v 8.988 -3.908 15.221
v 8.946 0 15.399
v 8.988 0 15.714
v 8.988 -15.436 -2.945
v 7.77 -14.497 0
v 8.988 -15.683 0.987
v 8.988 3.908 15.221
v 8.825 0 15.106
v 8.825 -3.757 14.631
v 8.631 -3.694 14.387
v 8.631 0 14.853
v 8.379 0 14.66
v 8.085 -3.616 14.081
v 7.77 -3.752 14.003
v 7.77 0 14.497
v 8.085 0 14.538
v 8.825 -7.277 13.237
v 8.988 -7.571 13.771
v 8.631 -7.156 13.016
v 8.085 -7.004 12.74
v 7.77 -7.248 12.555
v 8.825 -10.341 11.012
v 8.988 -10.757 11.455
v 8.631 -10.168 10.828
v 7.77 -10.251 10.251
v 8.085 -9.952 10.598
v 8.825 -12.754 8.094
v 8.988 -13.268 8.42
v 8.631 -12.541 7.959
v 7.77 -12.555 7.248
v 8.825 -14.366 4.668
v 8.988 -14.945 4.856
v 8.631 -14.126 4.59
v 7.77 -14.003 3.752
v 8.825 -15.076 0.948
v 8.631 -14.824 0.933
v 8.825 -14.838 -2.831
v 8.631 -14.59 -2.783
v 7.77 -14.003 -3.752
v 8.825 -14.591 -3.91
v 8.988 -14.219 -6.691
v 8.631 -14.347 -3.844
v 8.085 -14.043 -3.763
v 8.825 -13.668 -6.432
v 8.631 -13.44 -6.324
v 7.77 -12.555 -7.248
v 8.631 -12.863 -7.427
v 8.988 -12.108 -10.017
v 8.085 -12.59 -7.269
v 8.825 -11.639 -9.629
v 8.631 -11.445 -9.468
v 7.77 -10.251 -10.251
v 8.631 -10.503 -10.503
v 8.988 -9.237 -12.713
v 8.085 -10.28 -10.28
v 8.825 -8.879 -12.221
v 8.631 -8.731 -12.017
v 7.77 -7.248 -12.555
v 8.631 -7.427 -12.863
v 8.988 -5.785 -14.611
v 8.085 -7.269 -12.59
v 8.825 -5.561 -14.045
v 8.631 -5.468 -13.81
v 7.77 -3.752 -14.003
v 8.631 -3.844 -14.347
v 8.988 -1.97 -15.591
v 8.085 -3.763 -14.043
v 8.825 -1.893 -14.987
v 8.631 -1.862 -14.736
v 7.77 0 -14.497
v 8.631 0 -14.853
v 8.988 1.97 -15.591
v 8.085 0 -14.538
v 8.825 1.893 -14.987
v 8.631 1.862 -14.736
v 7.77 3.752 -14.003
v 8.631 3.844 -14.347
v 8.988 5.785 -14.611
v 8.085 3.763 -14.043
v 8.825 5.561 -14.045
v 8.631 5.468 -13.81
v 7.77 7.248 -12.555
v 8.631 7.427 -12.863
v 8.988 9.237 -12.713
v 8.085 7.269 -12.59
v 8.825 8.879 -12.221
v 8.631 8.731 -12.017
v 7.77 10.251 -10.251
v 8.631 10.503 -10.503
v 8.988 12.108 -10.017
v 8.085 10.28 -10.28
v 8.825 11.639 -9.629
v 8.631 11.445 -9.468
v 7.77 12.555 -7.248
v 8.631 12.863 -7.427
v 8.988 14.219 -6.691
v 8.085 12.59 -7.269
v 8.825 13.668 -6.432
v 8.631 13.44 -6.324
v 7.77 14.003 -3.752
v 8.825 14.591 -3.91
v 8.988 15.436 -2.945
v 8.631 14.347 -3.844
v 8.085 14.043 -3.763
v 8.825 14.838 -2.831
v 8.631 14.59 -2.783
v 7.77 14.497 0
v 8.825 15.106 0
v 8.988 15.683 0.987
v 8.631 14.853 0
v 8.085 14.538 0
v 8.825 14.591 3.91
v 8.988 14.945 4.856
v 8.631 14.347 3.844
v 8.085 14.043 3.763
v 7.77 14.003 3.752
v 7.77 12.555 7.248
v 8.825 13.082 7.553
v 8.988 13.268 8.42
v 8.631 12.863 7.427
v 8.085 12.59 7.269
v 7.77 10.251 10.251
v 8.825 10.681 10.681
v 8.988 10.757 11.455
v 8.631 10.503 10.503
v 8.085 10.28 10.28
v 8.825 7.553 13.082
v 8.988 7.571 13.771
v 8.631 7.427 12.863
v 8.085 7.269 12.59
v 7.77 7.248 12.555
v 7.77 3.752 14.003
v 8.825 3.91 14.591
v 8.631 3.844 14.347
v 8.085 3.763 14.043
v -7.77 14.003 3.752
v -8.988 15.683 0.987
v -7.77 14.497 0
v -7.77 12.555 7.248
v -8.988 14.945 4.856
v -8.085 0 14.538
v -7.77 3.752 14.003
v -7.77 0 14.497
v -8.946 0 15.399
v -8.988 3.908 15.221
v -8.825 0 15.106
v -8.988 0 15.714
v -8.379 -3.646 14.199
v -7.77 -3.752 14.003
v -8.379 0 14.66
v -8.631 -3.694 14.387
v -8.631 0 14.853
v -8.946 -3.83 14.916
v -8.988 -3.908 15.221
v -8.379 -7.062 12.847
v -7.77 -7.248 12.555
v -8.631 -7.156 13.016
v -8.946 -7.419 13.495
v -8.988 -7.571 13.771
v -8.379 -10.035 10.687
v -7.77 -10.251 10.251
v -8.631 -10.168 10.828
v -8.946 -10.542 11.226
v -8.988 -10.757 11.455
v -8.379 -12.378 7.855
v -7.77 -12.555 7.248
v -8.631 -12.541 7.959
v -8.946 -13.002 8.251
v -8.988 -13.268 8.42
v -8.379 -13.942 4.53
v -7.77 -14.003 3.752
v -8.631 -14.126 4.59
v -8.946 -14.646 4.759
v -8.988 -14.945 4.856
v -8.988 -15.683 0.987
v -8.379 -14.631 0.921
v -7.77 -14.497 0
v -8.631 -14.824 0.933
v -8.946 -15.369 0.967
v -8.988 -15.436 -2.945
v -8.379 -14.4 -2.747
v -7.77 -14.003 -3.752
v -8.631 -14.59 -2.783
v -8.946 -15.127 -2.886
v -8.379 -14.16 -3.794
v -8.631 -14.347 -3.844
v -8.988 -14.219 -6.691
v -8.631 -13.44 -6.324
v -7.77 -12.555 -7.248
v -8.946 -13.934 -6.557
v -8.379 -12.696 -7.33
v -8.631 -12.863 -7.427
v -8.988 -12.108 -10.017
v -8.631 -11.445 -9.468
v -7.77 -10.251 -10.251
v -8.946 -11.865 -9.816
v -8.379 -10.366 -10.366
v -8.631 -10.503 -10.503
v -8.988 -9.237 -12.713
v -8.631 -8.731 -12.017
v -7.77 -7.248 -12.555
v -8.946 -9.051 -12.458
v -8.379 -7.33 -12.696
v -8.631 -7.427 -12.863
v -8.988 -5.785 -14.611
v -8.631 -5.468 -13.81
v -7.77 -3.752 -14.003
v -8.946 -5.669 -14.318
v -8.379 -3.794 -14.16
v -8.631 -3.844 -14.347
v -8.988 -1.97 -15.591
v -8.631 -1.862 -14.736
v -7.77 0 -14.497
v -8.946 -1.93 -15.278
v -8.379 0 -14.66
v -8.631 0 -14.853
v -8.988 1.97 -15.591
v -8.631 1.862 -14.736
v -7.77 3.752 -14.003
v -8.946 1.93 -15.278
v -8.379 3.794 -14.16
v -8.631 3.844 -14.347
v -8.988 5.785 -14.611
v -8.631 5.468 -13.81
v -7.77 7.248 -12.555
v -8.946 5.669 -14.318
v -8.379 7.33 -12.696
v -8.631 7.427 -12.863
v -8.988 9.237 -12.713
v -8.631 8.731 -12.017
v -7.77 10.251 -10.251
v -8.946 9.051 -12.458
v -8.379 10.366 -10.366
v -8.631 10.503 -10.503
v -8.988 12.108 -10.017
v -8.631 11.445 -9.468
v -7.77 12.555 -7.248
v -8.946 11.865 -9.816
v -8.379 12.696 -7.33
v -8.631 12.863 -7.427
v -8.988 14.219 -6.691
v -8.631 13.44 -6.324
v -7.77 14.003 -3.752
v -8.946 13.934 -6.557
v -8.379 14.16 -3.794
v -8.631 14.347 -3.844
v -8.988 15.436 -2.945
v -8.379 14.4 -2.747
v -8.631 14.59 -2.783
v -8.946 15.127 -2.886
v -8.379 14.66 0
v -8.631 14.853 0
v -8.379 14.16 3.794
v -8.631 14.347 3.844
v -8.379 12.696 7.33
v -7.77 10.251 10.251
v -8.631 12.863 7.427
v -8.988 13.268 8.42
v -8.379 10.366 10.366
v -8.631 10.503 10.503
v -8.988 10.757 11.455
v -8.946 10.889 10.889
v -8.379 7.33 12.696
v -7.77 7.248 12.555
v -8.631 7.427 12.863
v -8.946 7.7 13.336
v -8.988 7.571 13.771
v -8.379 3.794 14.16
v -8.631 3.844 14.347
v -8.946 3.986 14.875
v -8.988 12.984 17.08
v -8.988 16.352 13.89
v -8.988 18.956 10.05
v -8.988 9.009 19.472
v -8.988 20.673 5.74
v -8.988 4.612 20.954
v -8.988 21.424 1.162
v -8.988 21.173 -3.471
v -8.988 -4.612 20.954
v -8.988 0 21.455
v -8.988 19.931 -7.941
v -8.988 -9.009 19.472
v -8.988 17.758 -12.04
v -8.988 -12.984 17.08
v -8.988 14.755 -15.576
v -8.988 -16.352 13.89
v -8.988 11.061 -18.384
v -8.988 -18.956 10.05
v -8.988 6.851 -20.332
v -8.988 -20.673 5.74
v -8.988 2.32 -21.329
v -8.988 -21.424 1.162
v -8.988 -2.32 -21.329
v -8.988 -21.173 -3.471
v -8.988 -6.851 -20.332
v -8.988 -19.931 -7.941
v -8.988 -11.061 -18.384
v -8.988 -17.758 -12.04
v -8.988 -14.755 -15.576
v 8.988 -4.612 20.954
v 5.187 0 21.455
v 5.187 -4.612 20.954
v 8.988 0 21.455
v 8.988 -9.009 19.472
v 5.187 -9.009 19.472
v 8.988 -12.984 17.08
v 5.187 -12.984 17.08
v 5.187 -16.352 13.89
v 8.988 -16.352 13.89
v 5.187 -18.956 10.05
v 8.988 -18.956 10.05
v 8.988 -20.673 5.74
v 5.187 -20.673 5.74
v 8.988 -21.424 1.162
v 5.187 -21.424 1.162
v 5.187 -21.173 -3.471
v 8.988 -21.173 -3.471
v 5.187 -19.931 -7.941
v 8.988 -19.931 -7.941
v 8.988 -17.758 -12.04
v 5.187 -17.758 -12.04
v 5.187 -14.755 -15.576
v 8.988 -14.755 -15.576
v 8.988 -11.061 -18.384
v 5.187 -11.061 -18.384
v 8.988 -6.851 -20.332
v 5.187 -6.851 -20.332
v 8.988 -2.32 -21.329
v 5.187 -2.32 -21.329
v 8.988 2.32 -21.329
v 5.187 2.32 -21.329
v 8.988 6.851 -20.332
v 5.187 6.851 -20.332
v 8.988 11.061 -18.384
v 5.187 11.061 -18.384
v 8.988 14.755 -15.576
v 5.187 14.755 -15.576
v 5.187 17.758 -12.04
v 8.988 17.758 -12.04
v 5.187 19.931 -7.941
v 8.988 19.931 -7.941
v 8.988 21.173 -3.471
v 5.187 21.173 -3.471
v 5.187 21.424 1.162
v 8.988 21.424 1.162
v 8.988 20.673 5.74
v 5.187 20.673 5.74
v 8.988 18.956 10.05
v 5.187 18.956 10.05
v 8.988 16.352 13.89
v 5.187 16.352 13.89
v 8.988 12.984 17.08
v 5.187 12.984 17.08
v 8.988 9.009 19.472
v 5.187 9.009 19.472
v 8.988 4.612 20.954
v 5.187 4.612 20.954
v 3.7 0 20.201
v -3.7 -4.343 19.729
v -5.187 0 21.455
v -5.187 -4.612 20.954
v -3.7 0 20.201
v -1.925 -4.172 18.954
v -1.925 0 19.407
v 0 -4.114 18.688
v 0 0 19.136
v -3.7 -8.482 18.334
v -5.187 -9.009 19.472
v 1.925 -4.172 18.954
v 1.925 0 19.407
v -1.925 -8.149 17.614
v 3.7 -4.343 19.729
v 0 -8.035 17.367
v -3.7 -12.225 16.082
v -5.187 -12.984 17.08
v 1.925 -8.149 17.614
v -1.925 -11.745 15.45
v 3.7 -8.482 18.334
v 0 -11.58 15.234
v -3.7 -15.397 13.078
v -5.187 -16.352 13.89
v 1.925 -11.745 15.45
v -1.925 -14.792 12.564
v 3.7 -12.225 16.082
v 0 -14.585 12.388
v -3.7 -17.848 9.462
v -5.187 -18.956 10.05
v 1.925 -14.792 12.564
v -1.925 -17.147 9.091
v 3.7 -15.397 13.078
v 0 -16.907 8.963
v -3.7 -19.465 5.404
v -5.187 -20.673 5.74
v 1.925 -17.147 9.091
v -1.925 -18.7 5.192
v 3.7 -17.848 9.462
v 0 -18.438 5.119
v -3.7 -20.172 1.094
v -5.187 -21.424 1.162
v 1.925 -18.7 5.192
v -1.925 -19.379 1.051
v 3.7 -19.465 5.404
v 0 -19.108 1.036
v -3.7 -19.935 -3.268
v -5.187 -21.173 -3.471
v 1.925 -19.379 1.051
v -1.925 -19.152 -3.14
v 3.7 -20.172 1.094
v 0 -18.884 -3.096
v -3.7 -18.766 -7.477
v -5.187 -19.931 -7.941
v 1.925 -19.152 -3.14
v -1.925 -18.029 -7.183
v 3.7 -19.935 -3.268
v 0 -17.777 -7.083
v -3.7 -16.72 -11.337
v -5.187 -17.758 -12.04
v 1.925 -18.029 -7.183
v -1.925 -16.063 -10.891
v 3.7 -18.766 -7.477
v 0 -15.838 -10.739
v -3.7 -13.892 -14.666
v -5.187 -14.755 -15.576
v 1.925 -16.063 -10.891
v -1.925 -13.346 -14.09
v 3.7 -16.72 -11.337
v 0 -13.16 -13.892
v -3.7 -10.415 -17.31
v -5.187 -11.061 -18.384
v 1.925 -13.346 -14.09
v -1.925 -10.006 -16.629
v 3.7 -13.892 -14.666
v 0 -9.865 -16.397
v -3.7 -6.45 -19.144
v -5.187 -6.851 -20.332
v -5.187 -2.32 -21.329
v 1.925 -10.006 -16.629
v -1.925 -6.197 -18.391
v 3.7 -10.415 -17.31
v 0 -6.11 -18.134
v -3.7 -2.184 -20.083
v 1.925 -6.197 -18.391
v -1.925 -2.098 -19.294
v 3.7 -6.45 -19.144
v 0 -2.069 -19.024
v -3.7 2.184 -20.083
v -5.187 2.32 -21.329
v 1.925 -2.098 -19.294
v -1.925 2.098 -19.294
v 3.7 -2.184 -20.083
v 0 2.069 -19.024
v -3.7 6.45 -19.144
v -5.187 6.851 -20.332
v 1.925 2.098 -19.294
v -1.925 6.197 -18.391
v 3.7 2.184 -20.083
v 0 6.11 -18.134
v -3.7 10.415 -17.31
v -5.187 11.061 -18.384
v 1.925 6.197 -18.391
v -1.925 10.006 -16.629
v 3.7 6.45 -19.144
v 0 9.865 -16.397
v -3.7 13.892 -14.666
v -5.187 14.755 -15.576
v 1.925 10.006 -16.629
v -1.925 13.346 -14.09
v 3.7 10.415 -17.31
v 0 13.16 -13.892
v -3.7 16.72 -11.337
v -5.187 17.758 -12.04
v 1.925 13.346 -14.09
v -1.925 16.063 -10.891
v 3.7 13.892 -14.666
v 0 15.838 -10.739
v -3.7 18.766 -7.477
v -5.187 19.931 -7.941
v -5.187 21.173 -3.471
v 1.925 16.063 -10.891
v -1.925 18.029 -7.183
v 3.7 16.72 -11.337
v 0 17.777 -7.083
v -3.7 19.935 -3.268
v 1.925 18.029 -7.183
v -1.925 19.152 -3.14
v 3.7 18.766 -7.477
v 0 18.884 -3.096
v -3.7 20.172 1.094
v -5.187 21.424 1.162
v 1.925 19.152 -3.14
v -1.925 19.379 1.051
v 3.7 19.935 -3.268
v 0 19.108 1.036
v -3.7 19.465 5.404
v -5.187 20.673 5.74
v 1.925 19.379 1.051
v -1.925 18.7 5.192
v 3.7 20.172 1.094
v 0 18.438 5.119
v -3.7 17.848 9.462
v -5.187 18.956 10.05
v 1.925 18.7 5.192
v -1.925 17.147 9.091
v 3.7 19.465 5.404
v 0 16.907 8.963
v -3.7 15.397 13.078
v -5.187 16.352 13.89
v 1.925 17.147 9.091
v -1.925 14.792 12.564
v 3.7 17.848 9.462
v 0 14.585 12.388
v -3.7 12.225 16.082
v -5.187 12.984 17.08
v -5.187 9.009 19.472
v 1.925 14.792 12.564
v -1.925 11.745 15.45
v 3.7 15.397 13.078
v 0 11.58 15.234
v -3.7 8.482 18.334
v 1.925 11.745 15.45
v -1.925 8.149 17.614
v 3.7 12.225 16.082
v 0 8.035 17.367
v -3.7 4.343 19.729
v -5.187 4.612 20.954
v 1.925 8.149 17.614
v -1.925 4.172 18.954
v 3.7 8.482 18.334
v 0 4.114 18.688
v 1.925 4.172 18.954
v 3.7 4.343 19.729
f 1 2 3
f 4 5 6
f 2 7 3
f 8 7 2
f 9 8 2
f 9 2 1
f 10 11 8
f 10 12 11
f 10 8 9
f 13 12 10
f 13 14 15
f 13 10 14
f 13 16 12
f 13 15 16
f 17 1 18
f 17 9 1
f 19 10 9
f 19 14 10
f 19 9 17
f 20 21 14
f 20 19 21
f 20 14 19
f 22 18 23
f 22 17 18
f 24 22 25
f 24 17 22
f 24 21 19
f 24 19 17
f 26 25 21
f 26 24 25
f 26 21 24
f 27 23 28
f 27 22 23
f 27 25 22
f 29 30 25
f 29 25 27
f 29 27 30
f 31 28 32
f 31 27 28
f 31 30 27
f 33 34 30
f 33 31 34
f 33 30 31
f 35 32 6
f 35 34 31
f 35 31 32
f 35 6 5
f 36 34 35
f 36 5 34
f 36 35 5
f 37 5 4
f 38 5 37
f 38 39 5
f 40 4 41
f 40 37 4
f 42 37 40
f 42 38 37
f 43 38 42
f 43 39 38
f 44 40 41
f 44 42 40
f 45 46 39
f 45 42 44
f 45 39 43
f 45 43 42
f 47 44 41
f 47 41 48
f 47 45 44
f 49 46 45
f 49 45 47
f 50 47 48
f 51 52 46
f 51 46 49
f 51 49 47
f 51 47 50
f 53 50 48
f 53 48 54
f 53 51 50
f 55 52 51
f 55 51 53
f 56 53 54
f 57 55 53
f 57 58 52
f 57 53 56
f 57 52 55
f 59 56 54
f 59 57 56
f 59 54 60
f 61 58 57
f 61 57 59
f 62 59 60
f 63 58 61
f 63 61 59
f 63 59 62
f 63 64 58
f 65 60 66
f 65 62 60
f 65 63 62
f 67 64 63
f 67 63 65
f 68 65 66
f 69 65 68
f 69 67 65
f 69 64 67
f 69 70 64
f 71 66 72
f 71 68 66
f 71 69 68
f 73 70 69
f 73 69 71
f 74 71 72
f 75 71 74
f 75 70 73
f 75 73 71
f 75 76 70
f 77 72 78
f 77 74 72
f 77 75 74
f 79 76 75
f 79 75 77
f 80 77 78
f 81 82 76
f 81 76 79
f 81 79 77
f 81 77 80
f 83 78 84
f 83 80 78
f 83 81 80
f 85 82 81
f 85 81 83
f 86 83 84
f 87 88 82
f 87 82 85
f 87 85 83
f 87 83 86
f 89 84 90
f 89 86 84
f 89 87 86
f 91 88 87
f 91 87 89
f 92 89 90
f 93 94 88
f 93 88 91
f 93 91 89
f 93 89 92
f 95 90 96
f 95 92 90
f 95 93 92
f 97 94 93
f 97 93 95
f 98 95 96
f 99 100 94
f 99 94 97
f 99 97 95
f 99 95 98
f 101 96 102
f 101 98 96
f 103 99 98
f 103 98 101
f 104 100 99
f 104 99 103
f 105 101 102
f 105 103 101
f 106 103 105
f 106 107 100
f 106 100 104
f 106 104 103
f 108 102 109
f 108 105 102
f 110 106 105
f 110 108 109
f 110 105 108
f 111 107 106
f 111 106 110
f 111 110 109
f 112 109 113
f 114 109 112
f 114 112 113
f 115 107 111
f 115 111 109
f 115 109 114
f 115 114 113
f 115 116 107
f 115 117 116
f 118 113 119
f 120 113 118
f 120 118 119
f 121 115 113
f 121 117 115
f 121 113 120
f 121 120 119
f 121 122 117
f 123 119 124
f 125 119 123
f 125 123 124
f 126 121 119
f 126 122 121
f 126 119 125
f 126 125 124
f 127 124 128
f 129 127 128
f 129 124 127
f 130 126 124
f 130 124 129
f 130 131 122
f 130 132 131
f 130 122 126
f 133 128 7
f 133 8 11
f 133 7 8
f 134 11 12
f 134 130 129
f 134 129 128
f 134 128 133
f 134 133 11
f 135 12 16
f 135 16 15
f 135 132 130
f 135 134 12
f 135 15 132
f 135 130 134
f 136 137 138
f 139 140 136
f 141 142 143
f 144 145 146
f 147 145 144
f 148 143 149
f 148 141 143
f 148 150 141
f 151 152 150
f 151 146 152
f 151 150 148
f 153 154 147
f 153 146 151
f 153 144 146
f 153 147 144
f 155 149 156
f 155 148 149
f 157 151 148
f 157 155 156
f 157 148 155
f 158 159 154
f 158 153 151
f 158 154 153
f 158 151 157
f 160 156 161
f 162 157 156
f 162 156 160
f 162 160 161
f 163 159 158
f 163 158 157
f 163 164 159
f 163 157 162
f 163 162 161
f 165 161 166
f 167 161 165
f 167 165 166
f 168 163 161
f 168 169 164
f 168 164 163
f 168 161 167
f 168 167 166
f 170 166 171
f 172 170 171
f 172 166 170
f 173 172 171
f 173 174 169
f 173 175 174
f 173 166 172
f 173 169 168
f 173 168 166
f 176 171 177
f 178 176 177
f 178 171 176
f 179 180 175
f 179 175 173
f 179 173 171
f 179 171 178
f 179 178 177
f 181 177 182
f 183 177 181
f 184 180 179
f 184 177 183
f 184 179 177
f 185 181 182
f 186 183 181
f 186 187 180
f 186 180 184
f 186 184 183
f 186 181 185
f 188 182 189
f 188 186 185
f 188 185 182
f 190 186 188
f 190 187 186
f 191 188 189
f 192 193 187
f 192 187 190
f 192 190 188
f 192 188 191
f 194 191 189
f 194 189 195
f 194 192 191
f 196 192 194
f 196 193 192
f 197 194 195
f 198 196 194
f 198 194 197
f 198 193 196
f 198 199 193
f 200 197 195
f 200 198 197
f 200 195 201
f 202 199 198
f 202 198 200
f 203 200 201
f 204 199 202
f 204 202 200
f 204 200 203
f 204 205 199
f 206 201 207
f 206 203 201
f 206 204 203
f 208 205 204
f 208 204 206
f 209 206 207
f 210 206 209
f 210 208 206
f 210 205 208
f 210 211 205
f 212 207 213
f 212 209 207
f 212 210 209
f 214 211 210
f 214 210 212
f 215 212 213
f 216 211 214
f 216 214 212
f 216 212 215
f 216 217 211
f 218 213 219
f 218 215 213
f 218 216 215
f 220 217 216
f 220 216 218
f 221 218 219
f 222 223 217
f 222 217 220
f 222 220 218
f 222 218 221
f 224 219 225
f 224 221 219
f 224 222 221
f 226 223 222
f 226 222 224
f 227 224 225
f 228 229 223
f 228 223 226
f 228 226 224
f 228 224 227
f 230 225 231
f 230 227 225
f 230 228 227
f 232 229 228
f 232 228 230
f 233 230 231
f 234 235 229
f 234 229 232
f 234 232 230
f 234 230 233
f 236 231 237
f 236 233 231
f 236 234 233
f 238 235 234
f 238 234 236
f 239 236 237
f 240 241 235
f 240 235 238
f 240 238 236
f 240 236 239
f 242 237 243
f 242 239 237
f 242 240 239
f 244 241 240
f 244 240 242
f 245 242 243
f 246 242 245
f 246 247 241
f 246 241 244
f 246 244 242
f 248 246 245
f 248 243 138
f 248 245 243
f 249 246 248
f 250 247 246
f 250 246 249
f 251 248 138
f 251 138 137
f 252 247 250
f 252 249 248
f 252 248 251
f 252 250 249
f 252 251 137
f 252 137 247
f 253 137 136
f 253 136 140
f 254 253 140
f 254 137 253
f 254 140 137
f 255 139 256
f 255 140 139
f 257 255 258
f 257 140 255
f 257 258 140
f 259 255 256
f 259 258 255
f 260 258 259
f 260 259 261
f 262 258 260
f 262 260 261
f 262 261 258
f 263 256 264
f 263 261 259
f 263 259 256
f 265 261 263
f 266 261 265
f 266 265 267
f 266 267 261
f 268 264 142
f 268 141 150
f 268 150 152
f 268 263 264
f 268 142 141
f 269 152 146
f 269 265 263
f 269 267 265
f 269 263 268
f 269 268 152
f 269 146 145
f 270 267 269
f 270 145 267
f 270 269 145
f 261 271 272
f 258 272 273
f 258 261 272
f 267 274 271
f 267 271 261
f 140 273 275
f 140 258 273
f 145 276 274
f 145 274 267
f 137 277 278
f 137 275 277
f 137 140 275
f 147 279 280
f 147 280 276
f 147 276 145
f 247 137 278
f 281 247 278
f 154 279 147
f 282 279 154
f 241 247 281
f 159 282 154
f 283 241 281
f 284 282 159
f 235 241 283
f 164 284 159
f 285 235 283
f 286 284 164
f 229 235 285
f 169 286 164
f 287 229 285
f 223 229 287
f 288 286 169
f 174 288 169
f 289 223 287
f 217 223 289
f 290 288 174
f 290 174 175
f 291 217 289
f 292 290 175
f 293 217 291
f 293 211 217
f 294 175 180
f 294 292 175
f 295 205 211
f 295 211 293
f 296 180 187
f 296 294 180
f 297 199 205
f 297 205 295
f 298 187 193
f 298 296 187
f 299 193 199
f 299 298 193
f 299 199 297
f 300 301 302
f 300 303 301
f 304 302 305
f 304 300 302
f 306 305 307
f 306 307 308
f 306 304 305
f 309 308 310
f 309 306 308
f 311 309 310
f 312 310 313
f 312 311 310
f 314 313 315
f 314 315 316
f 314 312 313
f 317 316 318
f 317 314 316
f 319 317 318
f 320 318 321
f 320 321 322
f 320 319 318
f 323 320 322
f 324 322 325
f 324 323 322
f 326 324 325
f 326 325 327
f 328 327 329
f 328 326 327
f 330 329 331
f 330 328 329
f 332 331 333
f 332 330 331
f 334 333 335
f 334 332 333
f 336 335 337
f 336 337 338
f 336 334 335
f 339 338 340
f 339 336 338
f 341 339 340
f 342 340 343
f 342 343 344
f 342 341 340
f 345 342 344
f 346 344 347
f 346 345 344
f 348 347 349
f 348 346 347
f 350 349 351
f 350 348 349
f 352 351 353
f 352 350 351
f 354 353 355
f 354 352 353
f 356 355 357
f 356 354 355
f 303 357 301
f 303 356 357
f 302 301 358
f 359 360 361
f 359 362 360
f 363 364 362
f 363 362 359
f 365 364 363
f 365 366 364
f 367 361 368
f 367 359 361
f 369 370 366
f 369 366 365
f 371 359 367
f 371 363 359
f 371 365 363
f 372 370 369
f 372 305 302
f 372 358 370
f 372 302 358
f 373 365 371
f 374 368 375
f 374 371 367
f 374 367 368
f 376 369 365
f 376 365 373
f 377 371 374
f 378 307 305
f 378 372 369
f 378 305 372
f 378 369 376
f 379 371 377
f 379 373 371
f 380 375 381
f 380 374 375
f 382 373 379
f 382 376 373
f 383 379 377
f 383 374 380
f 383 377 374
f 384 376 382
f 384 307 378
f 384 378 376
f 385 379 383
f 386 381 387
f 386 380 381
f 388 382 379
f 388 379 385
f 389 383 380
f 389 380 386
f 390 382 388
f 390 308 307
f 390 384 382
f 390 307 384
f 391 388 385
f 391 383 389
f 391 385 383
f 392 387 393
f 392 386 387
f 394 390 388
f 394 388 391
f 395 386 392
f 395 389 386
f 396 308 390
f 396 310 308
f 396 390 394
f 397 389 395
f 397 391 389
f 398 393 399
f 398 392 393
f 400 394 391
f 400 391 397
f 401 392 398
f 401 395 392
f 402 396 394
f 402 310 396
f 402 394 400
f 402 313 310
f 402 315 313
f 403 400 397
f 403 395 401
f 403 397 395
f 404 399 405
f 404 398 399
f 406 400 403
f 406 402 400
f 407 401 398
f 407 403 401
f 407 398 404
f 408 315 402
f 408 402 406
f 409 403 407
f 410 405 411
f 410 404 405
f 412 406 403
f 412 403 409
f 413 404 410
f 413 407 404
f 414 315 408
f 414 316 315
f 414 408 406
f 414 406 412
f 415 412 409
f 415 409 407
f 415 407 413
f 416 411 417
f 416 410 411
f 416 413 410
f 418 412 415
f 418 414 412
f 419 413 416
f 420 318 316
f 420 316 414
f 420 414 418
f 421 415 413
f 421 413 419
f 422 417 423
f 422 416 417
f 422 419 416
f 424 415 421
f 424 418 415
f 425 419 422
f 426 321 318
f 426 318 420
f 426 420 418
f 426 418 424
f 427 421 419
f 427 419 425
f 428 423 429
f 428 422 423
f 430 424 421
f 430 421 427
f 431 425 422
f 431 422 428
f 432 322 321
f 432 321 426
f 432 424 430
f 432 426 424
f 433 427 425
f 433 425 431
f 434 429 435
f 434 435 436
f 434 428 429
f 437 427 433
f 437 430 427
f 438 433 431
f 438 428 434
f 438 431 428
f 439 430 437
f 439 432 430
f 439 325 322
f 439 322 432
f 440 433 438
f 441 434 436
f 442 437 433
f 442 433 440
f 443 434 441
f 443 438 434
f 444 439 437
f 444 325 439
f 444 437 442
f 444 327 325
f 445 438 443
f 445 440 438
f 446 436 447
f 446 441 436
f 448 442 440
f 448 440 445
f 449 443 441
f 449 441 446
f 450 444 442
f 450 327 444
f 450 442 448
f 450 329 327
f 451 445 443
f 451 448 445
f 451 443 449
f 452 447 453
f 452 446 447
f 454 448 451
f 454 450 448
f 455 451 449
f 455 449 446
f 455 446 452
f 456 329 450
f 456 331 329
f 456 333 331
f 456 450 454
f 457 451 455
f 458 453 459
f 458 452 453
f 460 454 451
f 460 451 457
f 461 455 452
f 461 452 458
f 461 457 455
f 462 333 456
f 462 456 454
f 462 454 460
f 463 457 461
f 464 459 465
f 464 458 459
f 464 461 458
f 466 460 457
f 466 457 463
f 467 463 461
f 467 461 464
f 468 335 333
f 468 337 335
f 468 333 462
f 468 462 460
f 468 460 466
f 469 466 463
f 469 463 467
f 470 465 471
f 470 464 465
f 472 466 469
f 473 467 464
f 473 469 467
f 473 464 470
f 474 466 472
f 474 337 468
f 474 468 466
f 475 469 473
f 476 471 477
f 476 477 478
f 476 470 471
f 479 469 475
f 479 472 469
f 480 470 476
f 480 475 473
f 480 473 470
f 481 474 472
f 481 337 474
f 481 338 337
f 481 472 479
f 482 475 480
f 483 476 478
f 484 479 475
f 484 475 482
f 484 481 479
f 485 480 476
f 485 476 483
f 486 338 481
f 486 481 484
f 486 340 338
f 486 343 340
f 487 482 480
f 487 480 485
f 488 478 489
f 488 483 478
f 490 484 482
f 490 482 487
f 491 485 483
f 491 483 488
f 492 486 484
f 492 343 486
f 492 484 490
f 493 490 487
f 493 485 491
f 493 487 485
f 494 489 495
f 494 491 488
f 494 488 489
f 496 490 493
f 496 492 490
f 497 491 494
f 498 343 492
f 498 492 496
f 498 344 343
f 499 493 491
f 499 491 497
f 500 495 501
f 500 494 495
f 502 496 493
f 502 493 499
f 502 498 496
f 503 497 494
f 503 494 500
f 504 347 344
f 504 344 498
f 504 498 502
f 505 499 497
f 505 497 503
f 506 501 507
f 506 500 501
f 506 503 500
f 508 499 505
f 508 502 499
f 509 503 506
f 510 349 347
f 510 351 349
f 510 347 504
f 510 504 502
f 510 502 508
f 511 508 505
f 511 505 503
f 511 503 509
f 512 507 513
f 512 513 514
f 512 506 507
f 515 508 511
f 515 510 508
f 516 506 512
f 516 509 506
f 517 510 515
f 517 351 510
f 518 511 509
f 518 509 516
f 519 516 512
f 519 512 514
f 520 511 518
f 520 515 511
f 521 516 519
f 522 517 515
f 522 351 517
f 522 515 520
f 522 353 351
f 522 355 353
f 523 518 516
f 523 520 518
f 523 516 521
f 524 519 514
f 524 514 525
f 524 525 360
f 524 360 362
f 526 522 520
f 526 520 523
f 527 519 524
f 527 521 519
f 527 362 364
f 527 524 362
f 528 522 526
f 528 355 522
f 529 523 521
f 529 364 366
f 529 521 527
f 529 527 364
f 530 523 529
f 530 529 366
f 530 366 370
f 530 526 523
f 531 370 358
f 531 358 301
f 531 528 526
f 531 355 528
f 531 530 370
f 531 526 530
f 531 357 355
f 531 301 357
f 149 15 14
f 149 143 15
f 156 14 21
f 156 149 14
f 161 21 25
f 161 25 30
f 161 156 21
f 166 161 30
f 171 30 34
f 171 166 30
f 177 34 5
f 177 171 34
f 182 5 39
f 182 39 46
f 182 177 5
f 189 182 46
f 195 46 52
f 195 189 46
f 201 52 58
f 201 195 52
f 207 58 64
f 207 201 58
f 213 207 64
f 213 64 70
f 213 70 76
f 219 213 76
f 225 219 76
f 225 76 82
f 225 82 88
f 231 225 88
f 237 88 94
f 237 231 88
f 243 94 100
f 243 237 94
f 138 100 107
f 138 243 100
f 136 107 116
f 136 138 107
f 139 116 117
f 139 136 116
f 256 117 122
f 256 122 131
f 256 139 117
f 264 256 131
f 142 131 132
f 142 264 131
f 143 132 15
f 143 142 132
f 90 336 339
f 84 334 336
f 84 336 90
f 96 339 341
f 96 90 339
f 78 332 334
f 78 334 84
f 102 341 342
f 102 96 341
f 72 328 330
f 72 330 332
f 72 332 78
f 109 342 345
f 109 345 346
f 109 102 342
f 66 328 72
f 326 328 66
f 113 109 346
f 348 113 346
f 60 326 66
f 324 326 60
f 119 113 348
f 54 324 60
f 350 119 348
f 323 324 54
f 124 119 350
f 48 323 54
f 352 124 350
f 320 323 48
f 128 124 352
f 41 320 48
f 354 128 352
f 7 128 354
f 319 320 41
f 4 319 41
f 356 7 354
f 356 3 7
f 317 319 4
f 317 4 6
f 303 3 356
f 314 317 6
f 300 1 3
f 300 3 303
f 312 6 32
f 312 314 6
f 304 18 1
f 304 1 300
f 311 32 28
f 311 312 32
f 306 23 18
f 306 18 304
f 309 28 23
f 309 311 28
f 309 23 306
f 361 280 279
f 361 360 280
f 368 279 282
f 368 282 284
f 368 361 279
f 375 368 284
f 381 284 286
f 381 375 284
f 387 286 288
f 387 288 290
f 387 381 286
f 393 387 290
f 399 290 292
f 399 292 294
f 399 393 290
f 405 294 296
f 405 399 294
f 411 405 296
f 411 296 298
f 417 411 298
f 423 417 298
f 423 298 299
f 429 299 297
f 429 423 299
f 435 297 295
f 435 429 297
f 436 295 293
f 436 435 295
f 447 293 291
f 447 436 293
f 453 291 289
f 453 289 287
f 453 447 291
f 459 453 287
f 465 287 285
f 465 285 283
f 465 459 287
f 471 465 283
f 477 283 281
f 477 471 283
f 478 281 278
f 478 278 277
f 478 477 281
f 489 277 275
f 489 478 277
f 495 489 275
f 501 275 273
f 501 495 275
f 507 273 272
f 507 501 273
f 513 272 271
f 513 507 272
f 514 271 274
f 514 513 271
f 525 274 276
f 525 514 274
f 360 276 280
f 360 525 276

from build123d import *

# Parameters (mm, degrees)
SCALE1_SCALE = 0.2
SCALE2_SCALE = 1.9329
SCALE3_SCALE = 1.5


with BuildPart() as part:
    # Sketch1 → Revolve1 (revolve)
    with BuildSketch(Plane.XY, mode=Mode.PRIVATE) as revolve1_sk:
        with BuildLine():
            Line((-15.5, 37), (-8.94427191, 37))
            ThreePointArc((-8.94427191, 37), (0, 33), (8.94427191, 37))
            Line((8.94427191, 37), (15.5, 37))
            Line((15.5, 37), (15.5, 27.1))
            ThreePointArc((15.5, 27.1), (14.88492424, 25.61507576), (13.4, 25))
            Line((13.4, 25), (-13.4, 25))
            ThreePointArc((-13.4, 25), (-14.88492424, 25.61507576), (-15.5, 27.1))
            Line((-15.5, 27.1), (-15.5, 37))
        make_face()
    revolve(revolve1_sk.sketch.rotate(Axis((-31.142201835, 0, 0), (1, 0, 0)), 90), axis=Axis((-31.142201835, 0, 0), (1, 0, 0)))


with BuildPart() as part_1:
    # Scale1: scaled about (0, 0, 0)
    add(part.part.scale(SCALE1_SCALE))


with BuildPart() as part_2:
    # Scale2: scaled about (0, 0, 0)
    add(part_1.part.scale(SCALE2_SCALE))


with BuildPart() as part_3:
    # Scale3: scaled about (0, 0, 0)
    add(part_2.part.scale(SCALE3_SCALE))


solid = part_3.part
